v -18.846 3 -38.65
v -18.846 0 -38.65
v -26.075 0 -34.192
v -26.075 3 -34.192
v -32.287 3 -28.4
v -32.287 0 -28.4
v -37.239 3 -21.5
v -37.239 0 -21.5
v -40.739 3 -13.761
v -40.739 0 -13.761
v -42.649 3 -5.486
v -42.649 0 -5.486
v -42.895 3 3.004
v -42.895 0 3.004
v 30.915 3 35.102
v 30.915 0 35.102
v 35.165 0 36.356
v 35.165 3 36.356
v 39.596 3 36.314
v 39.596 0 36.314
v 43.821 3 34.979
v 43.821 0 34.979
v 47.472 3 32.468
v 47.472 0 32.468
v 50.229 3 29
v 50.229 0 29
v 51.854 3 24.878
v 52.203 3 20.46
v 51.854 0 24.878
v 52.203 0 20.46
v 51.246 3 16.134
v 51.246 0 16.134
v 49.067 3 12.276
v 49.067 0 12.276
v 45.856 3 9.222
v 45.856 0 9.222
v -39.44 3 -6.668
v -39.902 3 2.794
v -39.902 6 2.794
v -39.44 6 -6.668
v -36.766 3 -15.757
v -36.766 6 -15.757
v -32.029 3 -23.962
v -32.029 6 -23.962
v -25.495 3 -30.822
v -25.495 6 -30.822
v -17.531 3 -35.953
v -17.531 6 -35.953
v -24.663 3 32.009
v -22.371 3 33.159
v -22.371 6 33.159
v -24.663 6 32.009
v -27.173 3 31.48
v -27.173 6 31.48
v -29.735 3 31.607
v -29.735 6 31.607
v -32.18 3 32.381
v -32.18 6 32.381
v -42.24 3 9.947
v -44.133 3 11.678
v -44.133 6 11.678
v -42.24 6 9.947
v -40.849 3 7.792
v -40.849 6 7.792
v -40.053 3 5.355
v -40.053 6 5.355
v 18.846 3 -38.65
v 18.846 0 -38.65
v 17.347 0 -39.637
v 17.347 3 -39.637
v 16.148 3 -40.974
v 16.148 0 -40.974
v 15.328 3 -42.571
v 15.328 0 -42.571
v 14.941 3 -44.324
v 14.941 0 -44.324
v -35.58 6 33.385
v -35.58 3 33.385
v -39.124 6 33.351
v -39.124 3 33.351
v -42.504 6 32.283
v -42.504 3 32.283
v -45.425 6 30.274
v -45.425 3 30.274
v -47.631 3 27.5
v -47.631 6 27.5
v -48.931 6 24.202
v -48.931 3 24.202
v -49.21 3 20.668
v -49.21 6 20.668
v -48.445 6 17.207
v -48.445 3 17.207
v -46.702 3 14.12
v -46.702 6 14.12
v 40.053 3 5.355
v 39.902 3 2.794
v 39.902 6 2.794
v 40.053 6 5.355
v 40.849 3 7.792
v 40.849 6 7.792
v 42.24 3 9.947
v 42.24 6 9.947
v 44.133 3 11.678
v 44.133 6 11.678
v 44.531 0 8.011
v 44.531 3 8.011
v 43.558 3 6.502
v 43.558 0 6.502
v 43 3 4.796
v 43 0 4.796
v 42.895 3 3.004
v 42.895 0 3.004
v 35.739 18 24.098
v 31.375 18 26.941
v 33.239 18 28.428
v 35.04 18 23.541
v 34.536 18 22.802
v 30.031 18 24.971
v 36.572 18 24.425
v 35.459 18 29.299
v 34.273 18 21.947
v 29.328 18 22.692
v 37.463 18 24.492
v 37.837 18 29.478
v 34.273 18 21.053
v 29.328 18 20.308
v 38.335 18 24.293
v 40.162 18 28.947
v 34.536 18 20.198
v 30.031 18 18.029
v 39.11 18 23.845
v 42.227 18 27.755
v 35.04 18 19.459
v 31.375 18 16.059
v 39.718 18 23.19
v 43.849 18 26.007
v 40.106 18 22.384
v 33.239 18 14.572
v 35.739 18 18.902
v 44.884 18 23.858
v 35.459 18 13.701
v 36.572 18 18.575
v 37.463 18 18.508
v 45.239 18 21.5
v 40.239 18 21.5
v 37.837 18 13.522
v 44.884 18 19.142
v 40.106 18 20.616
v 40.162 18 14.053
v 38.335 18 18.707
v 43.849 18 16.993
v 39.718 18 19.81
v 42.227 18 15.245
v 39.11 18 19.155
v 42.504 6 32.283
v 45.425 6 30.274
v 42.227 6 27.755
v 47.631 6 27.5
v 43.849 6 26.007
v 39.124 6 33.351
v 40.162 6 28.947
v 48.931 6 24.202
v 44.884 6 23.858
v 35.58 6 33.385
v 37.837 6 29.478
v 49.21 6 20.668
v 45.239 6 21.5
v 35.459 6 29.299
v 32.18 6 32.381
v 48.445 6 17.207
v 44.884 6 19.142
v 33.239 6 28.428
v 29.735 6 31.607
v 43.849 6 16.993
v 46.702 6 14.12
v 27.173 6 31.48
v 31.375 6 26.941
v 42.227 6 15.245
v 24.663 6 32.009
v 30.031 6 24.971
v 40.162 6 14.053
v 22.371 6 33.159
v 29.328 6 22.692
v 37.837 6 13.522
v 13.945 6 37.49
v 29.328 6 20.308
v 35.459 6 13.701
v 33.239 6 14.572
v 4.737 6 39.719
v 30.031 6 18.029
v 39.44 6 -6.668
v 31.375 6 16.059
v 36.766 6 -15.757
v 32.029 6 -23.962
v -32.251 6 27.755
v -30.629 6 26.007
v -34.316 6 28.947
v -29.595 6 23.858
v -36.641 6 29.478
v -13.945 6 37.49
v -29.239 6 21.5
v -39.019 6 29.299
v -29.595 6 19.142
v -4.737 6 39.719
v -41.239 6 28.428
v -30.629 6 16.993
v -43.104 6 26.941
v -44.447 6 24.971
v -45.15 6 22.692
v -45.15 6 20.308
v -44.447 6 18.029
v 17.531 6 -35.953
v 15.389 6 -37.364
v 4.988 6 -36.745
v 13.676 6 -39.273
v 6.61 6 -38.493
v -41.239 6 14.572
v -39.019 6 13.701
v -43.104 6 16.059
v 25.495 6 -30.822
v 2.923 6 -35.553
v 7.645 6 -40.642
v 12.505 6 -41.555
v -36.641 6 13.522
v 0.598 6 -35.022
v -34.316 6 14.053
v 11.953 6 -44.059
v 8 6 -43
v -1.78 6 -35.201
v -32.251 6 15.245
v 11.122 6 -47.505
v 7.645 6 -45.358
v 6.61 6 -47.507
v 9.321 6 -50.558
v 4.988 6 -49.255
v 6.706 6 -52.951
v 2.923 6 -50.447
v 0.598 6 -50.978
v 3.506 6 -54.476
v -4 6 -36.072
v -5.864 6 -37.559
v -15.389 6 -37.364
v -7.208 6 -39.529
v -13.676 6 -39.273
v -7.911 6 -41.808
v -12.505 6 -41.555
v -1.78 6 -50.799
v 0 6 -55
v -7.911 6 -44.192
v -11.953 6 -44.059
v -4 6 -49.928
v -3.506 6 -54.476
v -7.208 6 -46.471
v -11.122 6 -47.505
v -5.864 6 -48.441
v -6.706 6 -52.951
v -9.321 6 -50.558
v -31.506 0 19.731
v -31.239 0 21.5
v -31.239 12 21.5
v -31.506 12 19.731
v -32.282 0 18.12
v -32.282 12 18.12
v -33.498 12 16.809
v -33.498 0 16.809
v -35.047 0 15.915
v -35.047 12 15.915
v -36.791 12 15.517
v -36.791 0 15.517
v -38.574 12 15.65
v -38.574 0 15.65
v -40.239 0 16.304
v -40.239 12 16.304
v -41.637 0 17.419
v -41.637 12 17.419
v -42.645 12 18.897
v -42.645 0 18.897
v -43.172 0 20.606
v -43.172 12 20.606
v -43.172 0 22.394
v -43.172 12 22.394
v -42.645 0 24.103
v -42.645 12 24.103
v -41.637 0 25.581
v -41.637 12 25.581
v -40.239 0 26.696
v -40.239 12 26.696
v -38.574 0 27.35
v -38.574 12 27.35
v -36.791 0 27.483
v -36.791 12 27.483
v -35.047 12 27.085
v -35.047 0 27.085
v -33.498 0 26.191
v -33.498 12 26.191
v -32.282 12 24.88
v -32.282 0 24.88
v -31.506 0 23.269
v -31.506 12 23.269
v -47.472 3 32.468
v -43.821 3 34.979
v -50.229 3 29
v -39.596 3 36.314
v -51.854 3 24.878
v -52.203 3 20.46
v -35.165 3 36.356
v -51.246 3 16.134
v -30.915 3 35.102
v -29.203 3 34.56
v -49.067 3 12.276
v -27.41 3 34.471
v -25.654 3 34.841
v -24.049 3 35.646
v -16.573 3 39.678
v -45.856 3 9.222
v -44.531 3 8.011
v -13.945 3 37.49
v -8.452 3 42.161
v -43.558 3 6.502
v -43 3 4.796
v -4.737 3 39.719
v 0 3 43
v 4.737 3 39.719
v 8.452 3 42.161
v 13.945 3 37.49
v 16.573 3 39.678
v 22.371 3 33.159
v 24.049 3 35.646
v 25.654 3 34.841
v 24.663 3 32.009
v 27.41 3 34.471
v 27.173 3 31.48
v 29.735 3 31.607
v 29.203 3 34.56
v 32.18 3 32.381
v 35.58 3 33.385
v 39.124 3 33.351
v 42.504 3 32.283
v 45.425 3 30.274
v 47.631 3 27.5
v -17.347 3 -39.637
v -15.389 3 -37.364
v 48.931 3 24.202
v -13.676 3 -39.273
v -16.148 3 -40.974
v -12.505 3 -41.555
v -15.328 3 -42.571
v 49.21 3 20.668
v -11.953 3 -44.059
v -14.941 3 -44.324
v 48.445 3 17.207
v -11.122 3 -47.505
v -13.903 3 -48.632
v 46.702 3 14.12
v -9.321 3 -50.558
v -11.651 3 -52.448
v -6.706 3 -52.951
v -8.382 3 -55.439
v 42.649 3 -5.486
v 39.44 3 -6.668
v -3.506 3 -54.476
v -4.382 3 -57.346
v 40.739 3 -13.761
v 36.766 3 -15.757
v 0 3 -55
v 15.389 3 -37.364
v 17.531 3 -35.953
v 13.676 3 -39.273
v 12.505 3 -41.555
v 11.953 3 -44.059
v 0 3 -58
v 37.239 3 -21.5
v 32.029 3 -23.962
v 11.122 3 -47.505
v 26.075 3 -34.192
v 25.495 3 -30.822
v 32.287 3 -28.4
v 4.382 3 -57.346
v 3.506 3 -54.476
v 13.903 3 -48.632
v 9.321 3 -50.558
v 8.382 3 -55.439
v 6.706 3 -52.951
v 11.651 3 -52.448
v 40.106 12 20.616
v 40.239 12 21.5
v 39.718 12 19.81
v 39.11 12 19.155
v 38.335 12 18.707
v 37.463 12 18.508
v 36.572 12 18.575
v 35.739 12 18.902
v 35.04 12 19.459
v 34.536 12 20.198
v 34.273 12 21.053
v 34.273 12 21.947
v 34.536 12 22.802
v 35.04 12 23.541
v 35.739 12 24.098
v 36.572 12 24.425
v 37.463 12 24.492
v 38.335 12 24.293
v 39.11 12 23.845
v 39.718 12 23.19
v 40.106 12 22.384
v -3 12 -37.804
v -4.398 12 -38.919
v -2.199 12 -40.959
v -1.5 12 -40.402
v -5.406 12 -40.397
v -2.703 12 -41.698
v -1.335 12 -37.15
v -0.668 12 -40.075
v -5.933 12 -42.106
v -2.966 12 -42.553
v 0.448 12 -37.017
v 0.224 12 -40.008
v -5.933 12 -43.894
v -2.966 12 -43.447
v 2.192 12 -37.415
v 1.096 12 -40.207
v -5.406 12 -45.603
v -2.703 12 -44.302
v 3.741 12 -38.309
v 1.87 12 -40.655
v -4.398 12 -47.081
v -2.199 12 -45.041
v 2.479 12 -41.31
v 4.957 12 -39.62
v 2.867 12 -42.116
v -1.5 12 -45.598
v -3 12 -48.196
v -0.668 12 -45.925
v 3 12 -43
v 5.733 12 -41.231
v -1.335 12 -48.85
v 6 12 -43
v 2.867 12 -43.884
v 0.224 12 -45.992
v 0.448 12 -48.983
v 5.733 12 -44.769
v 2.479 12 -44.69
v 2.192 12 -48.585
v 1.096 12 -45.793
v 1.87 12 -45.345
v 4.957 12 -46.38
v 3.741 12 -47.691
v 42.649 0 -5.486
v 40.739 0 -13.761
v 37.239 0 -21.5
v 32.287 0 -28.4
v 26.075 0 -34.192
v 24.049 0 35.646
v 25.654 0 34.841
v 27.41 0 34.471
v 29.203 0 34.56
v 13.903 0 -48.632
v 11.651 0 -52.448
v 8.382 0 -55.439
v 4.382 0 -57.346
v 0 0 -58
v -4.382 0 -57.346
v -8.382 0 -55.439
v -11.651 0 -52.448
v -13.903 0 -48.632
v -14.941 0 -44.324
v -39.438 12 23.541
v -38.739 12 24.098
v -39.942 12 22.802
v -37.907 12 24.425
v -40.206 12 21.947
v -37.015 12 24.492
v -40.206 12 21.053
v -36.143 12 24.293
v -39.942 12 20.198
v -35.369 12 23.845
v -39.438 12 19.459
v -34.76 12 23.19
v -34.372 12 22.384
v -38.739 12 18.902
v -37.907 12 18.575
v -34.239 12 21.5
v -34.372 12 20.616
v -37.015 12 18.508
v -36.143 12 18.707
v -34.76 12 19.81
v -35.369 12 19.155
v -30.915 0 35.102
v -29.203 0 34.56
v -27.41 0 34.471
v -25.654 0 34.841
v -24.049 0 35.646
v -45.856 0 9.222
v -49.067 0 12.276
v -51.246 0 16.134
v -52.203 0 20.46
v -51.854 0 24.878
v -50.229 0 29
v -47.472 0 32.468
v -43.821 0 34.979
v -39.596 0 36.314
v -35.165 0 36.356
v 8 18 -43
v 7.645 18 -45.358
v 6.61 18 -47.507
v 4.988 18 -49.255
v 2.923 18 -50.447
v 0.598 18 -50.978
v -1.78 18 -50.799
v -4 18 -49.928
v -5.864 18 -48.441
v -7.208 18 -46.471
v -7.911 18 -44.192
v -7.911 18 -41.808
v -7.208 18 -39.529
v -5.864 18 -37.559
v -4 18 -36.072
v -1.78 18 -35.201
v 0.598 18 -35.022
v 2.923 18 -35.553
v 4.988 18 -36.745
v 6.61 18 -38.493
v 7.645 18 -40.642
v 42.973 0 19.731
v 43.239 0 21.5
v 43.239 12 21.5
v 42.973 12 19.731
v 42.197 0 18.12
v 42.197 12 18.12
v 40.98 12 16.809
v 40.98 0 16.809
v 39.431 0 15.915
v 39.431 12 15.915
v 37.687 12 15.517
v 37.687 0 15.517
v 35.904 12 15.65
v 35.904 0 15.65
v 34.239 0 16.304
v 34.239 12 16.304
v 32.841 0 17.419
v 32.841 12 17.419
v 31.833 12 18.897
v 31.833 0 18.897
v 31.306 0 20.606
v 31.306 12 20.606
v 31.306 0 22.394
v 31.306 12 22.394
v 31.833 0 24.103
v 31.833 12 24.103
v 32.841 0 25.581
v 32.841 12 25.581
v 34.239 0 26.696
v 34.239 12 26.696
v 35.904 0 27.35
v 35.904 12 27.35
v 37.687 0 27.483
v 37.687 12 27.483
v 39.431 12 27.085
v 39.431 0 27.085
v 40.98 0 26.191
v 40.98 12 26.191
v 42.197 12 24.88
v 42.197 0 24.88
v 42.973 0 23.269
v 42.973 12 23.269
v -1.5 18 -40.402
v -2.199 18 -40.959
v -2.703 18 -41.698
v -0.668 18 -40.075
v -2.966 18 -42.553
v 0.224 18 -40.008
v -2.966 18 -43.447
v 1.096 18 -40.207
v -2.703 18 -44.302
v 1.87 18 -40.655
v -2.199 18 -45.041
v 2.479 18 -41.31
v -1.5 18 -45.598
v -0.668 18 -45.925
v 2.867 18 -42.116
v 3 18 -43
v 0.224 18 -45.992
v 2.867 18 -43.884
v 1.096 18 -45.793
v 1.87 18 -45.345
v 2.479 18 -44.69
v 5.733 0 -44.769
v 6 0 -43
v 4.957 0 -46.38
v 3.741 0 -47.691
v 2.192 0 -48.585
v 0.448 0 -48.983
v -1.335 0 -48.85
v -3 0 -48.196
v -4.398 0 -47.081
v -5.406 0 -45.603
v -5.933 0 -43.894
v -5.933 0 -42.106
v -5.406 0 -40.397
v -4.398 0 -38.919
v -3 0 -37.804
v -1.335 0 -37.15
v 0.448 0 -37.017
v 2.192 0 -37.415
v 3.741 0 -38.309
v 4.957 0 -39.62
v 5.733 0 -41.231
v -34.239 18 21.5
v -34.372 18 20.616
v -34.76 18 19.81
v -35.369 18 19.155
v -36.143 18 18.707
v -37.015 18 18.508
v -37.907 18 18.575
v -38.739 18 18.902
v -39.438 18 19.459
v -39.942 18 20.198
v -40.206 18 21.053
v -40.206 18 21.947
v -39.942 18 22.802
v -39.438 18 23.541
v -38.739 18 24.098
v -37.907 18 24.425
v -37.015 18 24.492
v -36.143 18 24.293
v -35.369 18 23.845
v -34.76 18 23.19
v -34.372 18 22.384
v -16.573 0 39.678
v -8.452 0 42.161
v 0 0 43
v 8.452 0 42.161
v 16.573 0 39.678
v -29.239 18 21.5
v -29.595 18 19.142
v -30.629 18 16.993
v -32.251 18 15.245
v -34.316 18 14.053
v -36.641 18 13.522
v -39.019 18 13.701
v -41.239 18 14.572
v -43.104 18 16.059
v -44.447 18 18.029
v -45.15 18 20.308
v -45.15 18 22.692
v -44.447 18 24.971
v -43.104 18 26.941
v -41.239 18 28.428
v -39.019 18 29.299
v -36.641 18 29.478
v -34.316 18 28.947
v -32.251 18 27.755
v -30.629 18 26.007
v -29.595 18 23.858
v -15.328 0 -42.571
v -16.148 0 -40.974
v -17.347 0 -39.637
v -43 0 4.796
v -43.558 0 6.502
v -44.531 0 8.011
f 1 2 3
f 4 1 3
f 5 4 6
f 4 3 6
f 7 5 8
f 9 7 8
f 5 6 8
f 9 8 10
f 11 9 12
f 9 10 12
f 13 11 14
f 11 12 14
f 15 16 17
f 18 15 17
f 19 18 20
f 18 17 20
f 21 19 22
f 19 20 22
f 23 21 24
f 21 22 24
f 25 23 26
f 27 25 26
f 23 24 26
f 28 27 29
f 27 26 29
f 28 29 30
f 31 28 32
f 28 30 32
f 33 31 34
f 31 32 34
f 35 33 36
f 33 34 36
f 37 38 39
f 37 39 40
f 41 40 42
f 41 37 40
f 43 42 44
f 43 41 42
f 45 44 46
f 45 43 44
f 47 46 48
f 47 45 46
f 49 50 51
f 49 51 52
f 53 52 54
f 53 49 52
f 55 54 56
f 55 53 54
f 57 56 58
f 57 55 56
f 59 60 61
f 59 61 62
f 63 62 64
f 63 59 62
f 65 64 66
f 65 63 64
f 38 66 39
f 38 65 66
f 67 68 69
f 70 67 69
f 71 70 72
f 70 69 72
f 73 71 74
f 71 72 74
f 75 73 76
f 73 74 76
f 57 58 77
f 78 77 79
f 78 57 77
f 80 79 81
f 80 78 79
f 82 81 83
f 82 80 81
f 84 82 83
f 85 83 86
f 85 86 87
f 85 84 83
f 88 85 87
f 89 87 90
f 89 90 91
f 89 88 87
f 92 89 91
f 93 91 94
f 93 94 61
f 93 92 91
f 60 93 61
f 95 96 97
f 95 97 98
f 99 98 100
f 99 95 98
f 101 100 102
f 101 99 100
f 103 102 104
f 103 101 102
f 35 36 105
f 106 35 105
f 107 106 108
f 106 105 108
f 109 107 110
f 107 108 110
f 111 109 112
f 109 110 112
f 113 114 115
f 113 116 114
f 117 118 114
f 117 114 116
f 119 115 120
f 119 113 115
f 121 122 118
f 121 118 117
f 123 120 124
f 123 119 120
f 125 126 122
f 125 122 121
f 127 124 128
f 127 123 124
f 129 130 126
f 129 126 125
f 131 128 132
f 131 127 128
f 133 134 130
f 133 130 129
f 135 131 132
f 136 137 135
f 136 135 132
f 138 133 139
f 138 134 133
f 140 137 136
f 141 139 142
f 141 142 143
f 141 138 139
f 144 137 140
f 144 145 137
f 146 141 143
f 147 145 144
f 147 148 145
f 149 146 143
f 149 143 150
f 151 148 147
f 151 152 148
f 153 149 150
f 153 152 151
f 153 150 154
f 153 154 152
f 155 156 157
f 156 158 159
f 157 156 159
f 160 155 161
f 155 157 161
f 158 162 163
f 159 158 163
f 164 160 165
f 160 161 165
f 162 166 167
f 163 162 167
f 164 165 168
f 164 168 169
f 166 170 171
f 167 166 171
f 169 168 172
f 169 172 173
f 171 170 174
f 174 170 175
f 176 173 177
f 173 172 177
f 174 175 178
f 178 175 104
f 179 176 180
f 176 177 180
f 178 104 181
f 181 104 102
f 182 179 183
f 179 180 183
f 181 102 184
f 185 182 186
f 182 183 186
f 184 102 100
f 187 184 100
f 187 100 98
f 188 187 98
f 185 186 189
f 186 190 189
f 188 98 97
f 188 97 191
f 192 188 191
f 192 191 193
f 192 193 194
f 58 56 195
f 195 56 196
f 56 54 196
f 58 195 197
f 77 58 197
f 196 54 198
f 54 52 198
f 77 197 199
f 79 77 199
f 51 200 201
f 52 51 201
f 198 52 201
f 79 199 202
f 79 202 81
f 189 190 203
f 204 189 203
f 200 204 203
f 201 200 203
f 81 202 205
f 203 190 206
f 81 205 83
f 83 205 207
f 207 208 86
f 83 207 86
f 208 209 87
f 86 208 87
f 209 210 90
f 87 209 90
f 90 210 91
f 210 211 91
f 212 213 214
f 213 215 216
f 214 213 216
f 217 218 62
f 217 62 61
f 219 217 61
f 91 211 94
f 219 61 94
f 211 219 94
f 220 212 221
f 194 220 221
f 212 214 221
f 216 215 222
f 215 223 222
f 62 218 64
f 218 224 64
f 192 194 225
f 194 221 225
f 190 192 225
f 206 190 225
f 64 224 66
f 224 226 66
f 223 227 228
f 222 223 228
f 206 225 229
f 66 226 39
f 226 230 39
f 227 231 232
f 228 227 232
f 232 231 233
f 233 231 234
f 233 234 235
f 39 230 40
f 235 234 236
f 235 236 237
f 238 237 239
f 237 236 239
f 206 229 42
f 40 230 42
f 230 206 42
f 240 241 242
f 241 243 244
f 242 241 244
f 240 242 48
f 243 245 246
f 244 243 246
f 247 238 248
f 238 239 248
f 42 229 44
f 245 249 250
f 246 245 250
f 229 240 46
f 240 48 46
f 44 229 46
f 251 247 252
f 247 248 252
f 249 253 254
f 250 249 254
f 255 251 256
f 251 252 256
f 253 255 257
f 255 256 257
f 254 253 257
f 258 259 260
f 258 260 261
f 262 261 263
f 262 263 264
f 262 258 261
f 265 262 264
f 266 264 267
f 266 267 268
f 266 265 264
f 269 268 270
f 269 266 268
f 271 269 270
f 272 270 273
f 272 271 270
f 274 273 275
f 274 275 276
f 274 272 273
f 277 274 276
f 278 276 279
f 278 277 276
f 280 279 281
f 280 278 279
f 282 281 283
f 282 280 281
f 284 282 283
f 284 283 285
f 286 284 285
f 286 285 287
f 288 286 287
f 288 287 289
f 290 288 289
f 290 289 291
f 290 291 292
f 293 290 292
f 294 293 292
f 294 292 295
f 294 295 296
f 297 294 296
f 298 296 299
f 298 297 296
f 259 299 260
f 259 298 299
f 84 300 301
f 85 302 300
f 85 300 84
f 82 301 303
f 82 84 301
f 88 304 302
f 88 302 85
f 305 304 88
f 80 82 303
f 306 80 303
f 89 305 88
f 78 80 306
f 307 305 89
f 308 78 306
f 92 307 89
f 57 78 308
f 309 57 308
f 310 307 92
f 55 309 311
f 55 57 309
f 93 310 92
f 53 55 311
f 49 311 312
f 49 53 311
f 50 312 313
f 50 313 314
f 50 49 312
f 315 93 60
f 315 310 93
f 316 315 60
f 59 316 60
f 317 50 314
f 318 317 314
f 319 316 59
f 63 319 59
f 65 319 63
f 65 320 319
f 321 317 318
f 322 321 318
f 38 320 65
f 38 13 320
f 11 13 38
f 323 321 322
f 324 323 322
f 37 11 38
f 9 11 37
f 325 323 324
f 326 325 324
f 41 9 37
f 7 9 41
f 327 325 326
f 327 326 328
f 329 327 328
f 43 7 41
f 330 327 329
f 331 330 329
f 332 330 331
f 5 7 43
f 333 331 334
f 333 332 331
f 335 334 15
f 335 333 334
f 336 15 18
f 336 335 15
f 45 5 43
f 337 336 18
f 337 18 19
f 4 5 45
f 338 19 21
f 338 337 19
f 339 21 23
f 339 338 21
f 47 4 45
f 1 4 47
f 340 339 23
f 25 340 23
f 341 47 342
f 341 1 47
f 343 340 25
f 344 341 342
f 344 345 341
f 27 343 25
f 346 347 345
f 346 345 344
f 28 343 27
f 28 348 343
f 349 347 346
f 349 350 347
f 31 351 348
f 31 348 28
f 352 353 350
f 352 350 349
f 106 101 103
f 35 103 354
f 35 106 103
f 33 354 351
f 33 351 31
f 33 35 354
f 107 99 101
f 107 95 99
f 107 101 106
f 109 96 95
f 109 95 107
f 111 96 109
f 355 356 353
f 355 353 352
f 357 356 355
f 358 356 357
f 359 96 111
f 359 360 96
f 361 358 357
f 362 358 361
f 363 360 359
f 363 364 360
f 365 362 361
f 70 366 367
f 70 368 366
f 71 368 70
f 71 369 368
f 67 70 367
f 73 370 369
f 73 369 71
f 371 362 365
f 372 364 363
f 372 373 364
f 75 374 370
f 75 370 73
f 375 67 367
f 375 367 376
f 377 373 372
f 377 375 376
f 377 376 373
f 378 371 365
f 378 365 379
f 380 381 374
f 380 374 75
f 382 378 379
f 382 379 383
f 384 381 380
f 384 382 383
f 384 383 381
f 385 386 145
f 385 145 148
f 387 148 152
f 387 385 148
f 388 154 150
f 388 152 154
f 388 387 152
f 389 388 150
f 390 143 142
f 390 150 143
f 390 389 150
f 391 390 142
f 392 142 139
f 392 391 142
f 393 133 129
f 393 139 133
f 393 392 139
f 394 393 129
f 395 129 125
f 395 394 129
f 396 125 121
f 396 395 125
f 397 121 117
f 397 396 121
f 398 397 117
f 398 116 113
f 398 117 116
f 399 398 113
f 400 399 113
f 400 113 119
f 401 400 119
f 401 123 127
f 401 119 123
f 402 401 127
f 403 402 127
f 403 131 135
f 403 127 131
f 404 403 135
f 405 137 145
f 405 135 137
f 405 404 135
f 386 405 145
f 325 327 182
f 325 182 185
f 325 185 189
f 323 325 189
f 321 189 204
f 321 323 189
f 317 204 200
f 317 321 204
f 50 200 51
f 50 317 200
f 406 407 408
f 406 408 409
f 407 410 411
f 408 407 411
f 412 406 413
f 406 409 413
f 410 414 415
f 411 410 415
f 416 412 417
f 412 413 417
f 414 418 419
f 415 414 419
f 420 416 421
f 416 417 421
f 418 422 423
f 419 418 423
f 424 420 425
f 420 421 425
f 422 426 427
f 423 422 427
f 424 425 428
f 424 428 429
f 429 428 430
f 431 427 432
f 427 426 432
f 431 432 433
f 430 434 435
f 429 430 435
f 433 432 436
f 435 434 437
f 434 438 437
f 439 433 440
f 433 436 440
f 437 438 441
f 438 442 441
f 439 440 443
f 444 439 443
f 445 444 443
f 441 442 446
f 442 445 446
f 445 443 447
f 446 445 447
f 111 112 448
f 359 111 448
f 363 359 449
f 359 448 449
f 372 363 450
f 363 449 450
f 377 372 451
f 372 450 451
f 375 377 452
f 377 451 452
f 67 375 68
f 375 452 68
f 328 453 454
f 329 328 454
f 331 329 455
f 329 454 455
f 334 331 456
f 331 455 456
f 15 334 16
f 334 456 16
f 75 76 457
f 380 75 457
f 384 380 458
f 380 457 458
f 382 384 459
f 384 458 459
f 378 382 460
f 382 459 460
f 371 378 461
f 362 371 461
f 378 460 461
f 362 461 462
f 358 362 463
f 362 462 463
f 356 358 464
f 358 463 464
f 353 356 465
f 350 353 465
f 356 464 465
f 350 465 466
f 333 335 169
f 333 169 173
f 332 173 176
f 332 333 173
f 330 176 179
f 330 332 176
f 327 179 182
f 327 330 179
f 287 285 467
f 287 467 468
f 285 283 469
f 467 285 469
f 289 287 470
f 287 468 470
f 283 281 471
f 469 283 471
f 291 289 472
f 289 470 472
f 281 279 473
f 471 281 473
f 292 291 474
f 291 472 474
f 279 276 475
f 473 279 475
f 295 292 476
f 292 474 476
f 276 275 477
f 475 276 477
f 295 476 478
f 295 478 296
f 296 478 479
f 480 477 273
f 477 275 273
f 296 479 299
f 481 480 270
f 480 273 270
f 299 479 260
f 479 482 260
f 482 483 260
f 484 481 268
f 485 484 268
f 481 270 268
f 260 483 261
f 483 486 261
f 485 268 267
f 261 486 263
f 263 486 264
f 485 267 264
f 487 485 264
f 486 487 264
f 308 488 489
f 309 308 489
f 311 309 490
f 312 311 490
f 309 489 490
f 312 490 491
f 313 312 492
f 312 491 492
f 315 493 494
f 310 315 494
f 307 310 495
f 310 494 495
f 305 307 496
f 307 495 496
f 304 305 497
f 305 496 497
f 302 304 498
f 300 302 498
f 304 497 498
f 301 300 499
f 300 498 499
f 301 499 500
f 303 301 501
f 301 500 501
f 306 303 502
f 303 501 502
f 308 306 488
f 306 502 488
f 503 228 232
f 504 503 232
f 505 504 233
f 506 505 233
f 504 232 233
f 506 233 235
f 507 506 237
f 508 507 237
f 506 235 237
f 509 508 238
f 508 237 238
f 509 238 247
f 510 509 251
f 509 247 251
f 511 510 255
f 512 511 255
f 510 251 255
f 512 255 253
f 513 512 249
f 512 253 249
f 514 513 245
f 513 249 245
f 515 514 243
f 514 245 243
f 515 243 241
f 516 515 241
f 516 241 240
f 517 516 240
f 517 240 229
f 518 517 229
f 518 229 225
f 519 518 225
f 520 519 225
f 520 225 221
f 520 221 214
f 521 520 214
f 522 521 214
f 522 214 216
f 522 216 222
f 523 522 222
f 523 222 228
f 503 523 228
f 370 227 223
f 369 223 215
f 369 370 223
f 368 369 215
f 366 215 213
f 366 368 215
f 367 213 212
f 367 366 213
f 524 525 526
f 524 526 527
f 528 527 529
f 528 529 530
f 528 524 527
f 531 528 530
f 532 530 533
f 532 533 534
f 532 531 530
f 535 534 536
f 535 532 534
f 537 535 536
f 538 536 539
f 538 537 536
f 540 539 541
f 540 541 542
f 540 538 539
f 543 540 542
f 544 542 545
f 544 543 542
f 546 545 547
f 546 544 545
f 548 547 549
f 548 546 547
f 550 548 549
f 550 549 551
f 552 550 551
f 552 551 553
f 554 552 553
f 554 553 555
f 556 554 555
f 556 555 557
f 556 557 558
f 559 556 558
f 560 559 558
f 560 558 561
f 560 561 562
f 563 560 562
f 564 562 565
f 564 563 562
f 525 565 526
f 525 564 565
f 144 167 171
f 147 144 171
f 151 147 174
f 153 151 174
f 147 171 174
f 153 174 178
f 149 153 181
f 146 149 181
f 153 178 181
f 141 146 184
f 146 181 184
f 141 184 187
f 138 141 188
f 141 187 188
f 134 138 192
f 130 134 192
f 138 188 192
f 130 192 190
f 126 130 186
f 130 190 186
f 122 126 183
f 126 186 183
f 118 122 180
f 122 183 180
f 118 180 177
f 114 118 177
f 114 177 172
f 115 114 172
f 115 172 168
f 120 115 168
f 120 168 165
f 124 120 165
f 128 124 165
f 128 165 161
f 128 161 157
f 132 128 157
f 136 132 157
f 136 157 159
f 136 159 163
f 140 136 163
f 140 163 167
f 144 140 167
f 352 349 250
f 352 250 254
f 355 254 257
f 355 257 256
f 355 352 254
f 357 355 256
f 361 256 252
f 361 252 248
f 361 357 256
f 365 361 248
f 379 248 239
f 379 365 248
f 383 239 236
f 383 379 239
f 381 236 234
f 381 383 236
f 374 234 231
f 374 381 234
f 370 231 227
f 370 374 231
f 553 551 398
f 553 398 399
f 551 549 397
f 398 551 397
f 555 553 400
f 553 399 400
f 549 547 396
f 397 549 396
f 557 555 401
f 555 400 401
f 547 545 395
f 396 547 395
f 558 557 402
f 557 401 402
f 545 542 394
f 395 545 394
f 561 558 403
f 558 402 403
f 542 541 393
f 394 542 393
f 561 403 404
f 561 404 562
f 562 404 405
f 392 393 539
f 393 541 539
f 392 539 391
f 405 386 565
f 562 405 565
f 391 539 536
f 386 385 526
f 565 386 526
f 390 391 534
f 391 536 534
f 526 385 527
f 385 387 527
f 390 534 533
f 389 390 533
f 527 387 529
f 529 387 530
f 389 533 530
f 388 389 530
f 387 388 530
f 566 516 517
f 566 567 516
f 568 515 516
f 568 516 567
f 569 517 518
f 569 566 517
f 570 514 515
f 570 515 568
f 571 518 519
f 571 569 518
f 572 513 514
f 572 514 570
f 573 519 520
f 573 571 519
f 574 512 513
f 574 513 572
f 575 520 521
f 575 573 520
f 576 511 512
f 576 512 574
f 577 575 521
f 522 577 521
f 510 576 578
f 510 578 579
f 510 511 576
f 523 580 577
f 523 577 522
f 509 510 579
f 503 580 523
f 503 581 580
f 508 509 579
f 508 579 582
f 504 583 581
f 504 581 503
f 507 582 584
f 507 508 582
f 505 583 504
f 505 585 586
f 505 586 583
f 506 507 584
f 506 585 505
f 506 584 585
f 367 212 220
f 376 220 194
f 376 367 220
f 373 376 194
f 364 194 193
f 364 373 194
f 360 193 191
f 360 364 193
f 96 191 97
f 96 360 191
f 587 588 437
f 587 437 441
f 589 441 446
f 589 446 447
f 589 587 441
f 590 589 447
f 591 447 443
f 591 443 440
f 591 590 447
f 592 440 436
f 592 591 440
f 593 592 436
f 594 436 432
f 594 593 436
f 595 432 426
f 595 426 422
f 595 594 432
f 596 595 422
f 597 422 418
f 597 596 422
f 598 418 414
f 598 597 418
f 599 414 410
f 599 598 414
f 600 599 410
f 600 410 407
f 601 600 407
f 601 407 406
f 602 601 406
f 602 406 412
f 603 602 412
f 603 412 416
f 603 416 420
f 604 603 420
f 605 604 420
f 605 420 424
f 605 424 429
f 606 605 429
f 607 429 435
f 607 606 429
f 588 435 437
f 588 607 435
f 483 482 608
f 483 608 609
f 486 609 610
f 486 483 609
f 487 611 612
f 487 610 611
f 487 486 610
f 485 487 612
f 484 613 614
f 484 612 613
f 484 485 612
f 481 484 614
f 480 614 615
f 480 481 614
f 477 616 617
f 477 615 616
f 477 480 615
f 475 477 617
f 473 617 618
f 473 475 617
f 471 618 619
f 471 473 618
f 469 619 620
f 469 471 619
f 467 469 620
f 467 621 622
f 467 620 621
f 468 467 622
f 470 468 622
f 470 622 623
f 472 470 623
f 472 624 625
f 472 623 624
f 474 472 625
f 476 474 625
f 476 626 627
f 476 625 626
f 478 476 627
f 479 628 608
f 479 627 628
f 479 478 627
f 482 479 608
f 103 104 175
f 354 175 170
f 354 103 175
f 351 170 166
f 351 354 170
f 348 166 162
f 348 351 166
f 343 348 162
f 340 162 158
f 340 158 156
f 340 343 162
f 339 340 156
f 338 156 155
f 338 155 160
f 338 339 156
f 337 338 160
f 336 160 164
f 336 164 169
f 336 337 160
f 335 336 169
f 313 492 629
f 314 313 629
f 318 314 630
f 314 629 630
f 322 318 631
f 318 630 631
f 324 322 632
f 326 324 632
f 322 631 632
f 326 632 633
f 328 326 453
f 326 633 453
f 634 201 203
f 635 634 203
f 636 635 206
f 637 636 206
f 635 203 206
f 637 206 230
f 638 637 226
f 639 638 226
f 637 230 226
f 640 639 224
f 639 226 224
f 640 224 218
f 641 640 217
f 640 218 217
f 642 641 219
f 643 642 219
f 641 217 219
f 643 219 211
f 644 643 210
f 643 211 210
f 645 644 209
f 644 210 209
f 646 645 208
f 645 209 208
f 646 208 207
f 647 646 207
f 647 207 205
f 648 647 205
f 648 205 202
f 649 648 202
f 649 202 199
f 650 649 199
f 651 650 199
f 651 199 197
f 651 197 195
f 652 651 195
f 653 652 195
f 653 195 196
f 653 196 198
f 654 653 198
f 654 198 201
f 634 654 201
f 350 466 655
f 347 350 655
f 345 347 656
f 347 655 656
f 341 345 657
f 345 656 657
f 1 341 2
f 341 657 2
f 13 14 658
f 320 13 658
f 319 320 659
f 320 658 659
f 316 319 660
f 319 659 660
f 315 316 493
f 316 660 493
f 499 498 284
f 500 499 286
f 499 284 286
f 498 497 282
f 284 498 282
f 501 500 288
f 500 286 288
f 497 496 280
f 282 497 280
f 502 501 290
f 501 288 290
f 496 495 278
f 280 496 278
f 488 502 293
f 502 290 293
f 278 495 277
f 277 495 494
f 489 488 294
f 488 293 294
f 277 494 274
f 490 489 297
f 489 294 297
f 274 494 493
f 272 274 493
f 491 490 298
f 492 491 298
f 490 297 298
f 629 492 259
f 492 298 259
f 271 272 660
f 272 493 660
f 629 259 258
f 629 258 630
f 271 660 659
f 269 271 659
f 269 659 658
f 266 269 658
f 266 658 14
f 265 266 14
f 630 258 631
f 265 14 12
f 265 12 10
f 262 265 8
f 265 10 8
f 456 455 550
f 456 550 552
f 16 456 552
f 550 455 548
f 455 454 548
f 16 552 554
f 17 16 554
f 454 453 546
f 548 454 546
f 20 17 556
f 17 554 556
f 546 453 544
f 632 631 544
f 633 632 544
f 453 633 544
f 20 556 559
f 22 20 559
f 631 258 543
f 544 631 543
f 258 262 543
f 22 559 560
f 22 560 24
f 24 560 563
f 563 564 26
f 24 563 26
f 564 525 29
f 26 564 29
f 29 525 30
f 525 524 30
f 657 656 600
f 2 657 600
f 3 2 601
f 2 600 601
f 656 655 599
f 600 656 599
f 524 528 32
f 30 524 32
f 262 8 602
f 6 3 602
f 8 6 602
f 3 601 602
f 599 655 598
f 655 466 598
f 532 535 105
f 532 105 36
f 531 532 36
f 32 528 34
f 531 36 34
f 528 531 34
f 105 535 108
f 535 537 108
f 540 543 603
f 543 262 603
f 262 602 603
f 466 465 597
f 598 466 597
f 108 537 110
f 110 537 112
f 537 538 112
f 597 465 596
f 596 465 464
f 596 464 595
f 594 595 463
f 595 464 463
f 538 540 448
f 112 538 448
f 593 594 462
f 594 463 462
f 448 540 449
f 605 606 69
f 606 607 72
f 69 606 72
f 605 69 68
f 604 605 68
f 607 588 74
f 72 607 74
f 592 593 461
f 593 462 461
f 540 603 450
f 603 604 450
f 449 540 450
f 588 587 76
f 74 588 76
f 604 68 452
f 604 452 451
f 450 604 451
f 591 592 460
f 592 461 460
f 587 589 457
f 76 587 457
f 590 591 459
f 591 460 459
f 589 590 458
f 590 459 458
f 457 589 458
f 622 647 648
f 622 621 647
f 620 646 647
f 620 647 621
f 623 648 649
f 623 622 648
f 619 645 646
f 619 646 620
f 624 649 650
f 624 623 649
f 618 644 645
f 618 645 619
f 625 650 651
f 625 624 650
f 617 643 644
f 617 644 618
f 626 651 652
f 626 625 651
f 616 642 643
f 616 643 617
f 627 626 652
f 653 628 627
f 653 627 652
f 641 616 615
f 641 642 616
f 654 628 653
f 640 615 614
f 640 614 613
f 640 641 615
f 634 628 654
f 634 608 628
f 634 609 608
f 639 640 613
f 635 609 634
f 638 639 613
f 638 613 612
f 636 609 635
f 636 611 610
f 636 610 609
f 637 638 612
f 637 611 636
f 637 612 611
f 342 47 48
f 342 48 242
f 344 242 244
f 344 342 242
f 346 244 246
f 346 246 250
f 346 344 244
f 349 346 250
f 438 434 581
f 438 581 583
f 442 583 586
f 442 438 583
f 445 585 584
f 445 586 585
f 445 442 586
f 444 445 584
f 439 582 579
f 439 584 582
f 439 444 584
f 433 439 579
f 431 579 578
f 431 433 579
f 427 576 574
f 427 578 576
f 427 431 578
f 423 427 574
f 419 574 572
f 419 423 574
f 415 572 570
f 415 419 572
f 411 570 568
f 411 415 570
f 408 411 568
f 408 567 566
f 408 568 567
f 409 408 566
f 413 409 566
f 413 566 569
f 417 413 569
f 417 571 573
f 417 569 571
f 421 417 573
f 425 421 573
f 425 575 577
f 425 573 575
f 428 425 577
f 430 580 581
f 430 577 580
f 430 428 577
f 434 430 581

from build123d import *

# Parameters (mm, degrees)
BOSS_EXTRUDE3_DEPTH = 3
SKETCH1_5_R         = 8
BOSS_EXTRUDE4_DEPTH = 6
SKETCH1_6_R         = 8
BOSS_EXTRUDE5_DEPTH = 18
SKETCH1_7_R         = 6
CUT_EXTRUDE1_DEPTH  = 12
SKETCH1_8_R         = 3
CUT_EXTRUDE2_DEPTH  = 125


with BuildPart() as part:
    # Sketch1 → Boss-Extrude3 (new body)
    with BuildSketch(Plane(origin=(0, 0, 0), x_dir=(1, 0, 0), z_dir=(0, 1, 0))):
        with BuildLine():
            ThreePointArc((42.894958583, -3.003752345), (37.239092363, 21.5), (18.846153454, 38.65))
            ThreePointArc((18.846153454, 38.65), (16.147655157, 40.973517523), (14.941453584, 44.323995772))
            ThreePointArc((14.941453584, 44.323995772), (0, 58), (-14.941453584, 44.323995772))
            ThreePointArc((-14.941453584, 44.323995772), (-16.147655157, 40.973517523), (-18.846153454, 38.65))
            ThreePointArc((-18.846153454, 38.65), (-37.239092363, 21.5), (-42.894958583, -3.003752345))
            ThreePointArc((-42.894958583, -3.003752345), (-43.557934635, -6.502479184), (-45.856433127, -9.222319513))
            ThreePointArc((-45.856433127, -9.222319513), (-50.229473419, -29), (-30.914979544, -35.101676259))
            ThreePointArc((-30.914979544, -35.101676259), (-27.410279478, -34.471038339), (-24.048805129, -35.646247655))
            ThreePointArc((-24.048805129, -35.646247655), (0, -43), (24.048805129, -35.646247655))
            ThreePointArc((24.048805129, -35.646247655), (27.410279478, -34.471038339), (30.914979544, -35.101676259))
            ThreePointArc((30.914979544, -35.101676259), (50.229473419, -29), (45.856433127, -9.222319513))
            ThreePointArc((45.856433127, -9.222319513), (43.557934635, -6.502479184), (42.894958583, -3.003752345))
        make_face()
        with BuildLine():
            ThreePointArc((-17.531305538, 35.953488372), (-34.641016151, 20), (-39.902287054, -2.794188228))
            ThreePointArc((-39.902287054, -2.794188228), (-40.8493957, -7.792369426), (-44.132964974, -11.67785561))
            ThreePointArc((-44.132964974, -11.67785561), (-47.631397208, -27.5), (-32.179802107, -32.381341007))
            ThreePointArc((-32.179802107, -32.381341007), (-27.173087728, -31.480429693), (-22.370981516, -33.159300144))
            ThreePointArc((-22.370981516, -33.159300144), (0, -40), (22.370981516, -33.159300144))
            ThreePointArc((22.370981516, -33.159300144), (27.173087728, -31.480429693), (32.179802107, -32.381341007))
            ThreePointArc((32.179802107, -32.381341007), (47.631397208, -27.5), (44.132964974, -11.67785561))
            ThreePointArc((44.132964974, -11.67785561), (40.8493957, -7.792369426), (39.902287054, -2.794188228))
            ThreePointArc((39.902287054, -2.794188228), (34.641016151, 20), (17.531305538, 35.953488372))
            ThreePointArc((17.531305538, 35.953488372), (13.676307972, 39.272799119), (11.953162867, 44.059196617))
            ThreePointArc((11.953162867, 44.059196617), (0, 55), (-11.953162867, 44.059196617))
            ThreePointArc((-11.953162867, 44.059196617), (-13.676307972, 39.272799119), (-17.531305538, 35.953488372))
        make_face(mode=Mode.SUBTRACT)
    extrude(amount=BOSS_EXTRUDE3_DEPTH)

    # Sketch1<5> → Boss-Extrude4 (add)
    with BuildSketch(Plane(origin=(0, 0, 0), x_dir=(1, 0, 0), z_dir=(0, 1, 0))):
        with BuildLine():
            ThreePointArc((-17.531305538, 35.953488372), (-13.676307972, 39.272799119), (-11.953162867, 44.059196617))
            ThreePointArc((-11.953162867, 44.059196617), (0, 55), (11.953162867, 44.059196617))
            ThreePointArc((11.953162867, 44.059196617), (13.676307972, 39.272799119), (17.531305538, 35.953488372))
            ThreePointArc((17.531305538, 35.953488372), (34.641016151, 20), (39.902287054, -2.794188228))
            ThreePointArc((39.902287054, -2.794188228), (40.8493957, -7.792369426), (44.132964974, -11.67785561))
            ThreePointArc((44.132964974, -11.67785561), (47.631397208, -27.5), (32.179802107, -32.381341007))
            ThreePointArc((32.179802107, -32.381341007), (27.173087728, -31.480429693), (22.370981516, -33.159300144))
            ThreePointArc((22.370981516, -33.159300144), (0, -40), (-22.370981516, -33.159300144))
            ThreePointArc((-22.370981516, -33.159300144), (-27.173087728, -31.480429693), (-32.179802107, -32.381341007))
            ThreePointArc((-32.179802107, -32.381341007), (-47.631397208, -27.5), (-44.132964974, -11.67785561))
            ThreePointArc((-44.132964974, -11.67785561), (-40.8493957, -7.792369426), (-39.902287054, -2.794188228))
            ThreePointArc((-39.902287054, -2.794188228), (-34.641016151, 20), (-17.531305538, 35.953488372))
        make_face()
        with Locations((37.239092363, -21.5)):
            Circle(SKETCH1_5_R, mode=Mode.SUBTRACT)
        with Locations((-37.239092363, -21.5)):
            Circle(SKETCH1_5_R, mode=Mode.SUBTRACT)
        with Locations((0, 43)):
            Circle(SKETCH1_5_R, mode=Mode.SUBTRACT)
    extrude(amount=BOSS_EXTRUDE4_DEPTH)

    # Sketch1<6> → Boss-Extrude5 (add)
    with BuildSketch(Plane(origin=(0, 0, 0), x_dir=(1, 0, 0), z_dir=(0, 1, 0))):
        with Locations((0, 43)):
            Circle(SKETCH1_6_R)
        with Locations((-37.239092363, -21.5)):
            Circle(SKETCH1_6_R)
        with Locations((37.239092363, -21.5)):
            Circle(SKETCH1_6_R)
    extrude(amount=BOSS_EXTRUDE5_DEPTH)

    # Sketch1<7> → Cut-Extrude1 (cut)
    with BuildSketch(Plane(origin=(0, 0, 0), x_dir=(1, 0, 0), z_dir=(0, 1, 0))):
        with Locations((0, 43)):
            Circle(SKETCH1_7_R)
        with Locations((37.239092363, -21.5)):
            Circle(SKETCH1_7_R)
        with Locations((-37.239092363, -21.5)):
            Circle(SKETCH1_7_R)
    extrude(amount=CUT_EXTRUDE1_DEPTH, mode=Mode.SUBTRACT)

    # Sketch1<8> → Cut-Extrude2 (cut)
    with BuildSketch(Plane(origin=(0, 0, 0), x_dir=(1, 0, 0), z_dir=(0, 1, 0))):
        with Locations((0, 43)):
            Circle(SKETCH1_8_R)
        with Locations((-37.239092363, -21.5)):
            Circle(SKETCH1_8_R)
        with Locations((37.239092363, -21.5)):
            Circle(SKETCH1_8_R)
    extrude(amount=CUT_EXTRUDE2_DEPTH, mode=Mode.SUBTRACT)


solid = part.part
